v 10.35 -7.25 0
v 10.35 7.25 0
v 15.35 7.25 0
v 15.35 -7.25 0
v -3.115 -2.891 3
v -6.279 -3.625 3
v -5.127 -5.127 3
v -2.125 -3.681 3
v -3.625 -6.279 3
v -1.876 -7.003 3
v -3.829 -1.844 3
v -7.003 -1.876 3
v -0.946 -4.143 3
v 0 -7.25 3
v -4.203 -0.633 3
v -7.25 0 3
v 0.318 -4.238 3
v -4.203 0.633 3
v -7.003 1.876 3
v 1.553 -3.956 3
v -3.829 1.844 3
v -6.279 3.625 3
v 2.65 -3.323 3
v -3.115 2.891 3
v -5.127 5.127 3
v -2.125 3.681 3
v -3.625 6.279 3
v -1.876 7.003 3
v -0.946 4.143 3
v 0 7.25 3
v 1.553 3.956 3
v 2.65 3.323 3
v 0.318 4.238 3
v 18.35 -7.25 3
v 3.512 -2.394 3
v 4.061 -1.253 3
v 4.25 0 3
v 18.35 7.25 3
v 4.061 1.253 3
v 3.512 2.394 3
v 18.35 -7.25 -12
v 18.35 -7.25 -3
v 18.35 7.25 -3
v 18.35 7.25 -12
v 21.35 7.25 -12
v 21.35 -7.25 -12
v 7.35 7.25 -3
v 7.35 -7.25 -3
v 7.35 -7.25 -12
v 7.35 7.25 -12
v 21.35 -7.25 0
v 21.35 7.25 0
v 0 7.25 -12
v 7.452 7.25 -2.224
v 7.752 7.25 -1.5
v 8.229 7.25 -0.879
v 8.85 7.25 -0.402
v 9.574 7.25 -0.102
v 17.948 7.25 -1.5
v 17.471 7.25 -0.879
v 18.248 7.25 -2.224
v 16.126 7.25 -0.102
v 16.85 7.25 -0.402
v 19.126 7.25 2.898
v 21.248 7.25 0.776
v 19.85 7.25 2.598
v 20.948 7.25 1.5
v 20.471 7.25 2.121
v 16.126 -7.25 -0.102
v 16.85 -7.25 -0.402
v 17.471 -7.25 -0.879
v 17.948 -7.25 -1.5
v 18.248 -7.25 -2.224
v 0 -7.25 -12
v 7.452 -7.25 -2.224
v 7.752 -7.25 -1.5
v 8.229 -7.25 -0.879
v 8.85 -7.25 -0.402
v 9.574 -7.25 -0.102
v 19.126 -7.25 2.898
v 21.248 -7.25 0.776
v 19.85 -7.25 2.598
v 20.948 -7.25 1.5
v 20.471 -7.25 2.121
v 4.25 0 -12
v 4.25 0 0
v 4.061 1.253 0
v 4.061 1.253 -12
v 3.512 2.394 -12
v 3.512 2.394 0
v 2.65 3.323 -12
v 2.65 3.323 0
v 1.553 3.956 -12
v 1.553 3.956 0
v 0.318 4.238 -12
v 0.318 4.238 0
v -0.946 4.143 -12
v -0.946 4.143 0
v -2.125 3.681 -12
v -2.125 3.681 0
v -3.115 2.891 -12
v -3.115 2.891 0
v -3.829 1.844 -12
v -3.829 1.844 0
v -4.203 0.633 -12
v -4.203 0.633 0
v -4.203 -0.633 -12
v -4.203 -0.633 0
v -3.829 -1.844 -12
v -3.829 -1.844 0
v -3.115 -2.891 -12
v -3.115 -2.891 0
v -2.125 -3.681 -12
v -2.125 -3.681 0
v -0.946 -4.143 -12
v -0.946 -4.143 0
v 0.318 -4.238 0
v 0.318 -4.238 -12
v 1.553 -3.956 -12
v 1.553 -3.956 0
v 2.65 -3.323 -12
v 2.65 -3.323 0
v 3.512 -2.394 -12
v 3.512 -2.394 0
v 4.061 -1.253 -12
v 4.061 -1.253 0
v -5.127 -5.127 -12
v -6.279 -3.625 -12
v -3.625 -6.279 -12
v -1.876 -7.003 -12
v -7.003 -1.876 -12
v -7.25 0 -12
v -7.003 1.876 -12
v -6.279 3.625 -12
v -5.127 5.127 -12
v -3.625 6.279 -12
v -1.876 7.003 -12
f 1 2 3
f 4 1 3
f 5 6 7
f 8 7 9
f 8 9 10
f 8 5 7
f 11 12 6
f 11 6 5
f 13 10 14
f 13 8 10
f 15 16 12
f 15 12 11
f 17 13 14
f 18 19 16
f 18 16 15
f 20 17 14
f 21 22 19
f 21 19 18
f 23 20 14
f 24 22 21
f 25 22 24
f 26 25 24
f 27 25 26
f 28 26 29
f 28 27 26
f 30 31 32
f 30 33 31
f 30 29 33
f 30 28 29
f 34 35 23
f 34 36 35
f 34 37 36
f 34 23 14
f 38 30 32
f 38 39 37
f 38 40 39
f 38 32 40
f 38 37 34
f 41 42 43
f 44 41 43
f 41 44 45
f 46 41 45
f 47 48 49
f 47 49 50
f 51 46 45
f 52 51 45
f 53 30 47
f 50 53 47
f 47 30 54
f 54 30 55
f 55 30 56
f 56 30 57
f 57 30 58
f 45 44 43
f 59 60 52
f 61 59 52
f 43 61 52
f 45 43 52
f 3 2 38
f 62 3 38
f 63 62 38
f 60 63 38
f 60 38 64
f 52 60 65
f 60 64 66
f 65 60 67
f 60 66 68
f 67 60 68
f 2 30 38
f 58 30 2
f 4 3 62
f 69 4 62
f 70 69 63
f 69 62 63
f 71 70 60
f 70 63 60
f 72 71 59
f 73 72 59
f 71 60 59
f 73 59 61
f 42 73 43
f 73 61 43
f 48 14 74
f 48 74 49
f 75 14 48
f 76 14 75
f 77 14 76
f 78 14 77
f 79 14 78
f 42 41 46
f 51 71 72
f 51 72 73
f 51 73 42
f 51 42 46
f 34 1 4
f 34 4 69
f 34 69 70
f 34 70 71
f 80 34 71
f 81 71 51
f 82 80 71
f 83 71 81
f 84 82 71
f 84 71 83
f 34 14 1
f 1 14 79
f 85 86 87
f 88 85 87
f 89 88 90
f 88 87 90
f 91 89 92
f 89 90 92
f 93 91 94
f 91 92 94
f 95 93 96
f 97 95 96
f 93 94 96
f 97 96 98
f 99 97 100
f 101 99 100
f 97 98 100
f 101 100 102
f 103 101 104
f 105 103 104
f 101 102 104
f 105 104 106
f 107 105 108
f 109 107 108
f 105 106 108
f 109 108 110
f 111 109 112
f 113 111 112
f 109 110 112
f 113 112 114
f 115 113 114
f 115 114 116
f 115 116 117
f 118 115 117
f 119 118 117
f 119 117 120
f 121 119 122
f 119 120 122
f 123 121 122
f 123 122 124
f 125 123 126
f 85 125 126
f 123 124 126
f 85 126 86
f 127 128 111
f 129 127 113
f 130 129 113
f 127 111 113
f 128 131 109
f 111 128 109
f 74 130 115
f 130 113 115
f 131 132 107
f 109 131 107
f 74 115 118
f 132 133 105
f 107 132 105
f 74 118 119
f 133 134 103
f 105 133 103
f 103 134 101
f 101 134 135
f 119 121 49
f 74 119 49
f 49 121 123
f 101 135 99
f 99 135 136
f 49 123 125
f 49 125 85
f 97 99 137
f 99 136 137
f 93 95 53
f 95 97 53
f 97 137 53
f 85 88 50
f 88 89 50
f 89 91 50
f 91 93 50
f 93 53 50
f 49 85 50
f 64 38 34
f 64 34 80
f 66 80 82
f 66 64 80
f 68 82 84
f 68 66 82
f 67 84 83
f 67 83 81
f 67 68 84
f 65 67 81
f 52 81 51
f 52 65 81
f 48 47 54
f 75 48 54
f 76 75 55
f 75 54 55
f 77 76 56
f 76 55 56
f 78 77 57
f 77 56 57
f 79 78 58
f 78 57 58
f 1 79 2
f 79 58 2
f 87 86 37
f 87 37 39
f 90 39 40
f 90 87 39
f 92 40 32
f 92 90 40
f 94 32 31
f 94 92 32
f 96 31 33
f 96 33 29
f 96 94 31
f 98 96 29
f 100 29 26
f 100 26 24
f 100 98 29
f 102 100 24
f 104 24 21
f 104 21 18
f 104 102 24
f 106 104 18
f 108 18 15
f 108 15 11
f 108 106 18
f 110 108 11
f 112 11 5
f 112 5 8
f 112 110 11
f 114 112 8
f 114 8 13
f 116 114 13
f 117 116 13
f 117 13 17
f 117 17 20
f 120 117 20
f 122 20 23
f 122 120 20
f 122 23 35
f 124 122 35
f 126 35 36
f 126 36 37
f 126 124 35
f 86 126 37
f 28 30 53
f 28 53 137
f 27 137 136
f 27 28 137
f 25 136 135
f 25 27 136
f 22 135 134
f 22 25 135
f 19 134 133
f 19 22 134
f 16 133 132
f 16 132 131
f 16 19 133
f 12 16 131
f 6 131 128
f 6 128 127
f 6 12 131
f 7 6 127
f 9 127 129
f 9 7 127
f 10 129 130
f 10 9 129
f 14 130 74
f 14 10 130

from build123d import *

# Parameters (mm, degrees)
F0_R        = 4.25
F0_W        = 11
F0_H        = 14.5
F0_W_2      = 3
F1_DEPTH    = 3
F2_DEPTH    = 12
F3_T1_DEPTH = 14.5
F3_T3_DEPTH = 29.5
F5_R        = 4.25
F6_DEPTH    = 22
F7_DEPTH    = 3
F8_T1_DEPTH = 28


# Not quite as in the source:
# - a fillet or chamfer that OpenCascade refuses, or shapes differently, is made with other operations: its cross-section is extruded or revolved along the edge and cut away or added


with BuildPart() as f1:
    # F0 (on Top) → F1 (new body)
    with BuildSketch(Plane.XY):
        with BuildLine():
            ThreePointArc((0, -7.25), (5.1265241636, -5.1265241636), (7.25, 0))
            ThreePointArc((7.25, 0), (5.1265241636, 5.1265241636), (0, 7.25))
            ThreePointArc((0, 7.25), (-7.25, 0), (0, -7.25))
        make_face()
        Circle(F0_R, mode=Mode.SUBTRACT)
        with BuildLine():
            Line((7.25, -7.25), (7.25, 0))
            ThreePointArc((7.25, 0), (5.1265241636, -5.1265241636), (0, -7.25))
            Line((0, -7.25), (7.25, -7.25))
        make_face()
        with BuildLine():
            ThreePointArc((0, 7.25), (5.1265241636, 5.1265241636), (7.25, 0))
            Line((7.25, 0), (7.25, 7.25))
            Line((7.25, 7.25), (0, 7.25))
        make_face()
        Polygon((7.25, 7.25), (7.25, 0), (7.25, -7.25), (7.35, -7.25), (7.35, 7.25), align=None)
        with Locations((12.85, 0)):
            Rectangle(F0_W, F0_H)
        with Locations((19.85, 0)):
            Rectangle(F0_W_2, F0_H)
    extrude(amount=F1_DEPTH)

    # F0 (on Top) → F2 (join)
    with BuildSketch(Plane.XY):
        with BuildLine():
            ThreePointArc((0, -7.25), (5.1265241636, -5.1265241636), (7.25, 0))
            ThreePointArc((7.25, 0), (5.1265241636, 5.1265241636), (0, 7.25))
            ThreePointArc((0, 7.25), (-7.25, 0), (0, -7.25))
        make_face()
        Circle(F0_R, mode=Mode.SUBTRACT)
        with BuildLine():
            ThreePointArc((0, 7.25), (5.1265241636, 5.1265241636), (7.25, 0))
            Line((7.25, 0), (7.25, 7.25))
            Line((7.25, 7.25), (0, 7.25))
        make_face()
        Polygon((7.25, 7.25), (7.25, 0), (7.25, -7.25), (7.35, -7.25), (7.35, 7.25), align=None)
        with Locations((19.85, 0)):
            Rectangle(F0_W_2, F0_H)
        with BuildLine():
            Line((7.25, -7.25), (7.25, 0))
            ThreePointArc((7.25, 0), (5.1265241636, -5.1265241636), (0, -7.25))
            Line((0, -7.25), (7.25, -7.25))
        make_face()
    extrude(amount=-F2_DEPTH)

    # F3: fillet of radius 3 on 3 edges, made by hand

    # F3_s2 → F3_t1 (join)
    with BuildSketch(Plane.XZ.offset(-7.25)):
        with BuildLine():
            ThreePointArc((7.35, -3), (8.2286796564, -0.8786796564), (10.35, 0))
            Line((10.35, 0), (7.35, 0))
            Line((7.35, 0), (7.35, -3))
        make_face()
        with BuildLine():
            ThreePointArc((15.35, 0), (17.4713203436, -0.8786796564), (18.35, -3))
            Line((18.35, -3), (18.35, 0))
            Line((18.35, 0), (15.35, 0))
        make_face()
    extrude(amount=F3_T1_DEPTH)

    # F3_s4 → F3_t3 (cut)
    with BuildSketch(Plane.XZ.offset(-14.75)):
        with BuildLine():
            ThreePointArc((18.35, 3), (20.4713203436, 2.1213203436), (21.35, 0))
            Line((21.35, 0), (21.35, 3))
            Line((21.35, 3), (18.35, 3))
        make_face()
    extrude(amount=F3_T3_DEPTH, mode=Mode.SUBTRACT)


with BuildPart() as f6:
    # F5 (on offset) → F6 (new body)
    with BuildSketch(Plane(origin=(0, 0, -37), x_dir=(1, 0, 0), z_dir=(0, 0, -1))):
        with BuildLine():
            Line((7.35, 7.25), (0, 7.25))
            ThreePointArc((0, 7.25), (-7.25, 0), (0, -7.25))
            Line((0, -7.25), (7.35, -7.25))
            Line((7.35, -7.25), (7.35, 7.25))
        make_face()
        Circle(F5_R, mode=Mode.SUBTRACT)
    extrude(amount=-F6_DEPTH)

    # F5 (on offset) → F7 (join)
    with BuildSketch(Plane(origin=(0, 0, -37), x_dir=(1, 0, 0), z_dir=(0, 0, -1))):
        with BuildLine():
            Line((7.35, 7.25), (0, 7.25))
            ThreePointArc((0, 7.25), (-7.25, 0), (0, -7.25))
            Line((0, -7.25), (7.35, -7.25))
            Line((7.35, -7.25), (7.35, 7.25))
        make_face()
        Circle(F5_R, mode=Mode.SUBTRACT)
        with BuildLine():
            ThreePointArc((0, -7.25), (-7.25, 0), (0, 7.25))
            Line((0, 7.25), (-37.25, 7.25))
            Line((-37.25, 7.25), (-37.25, 4))
            Line((-37.25, 4), (-22.25, 4))
            ThreePointArc((-22.25, 4), (-18.25, 0), (-22.25, -4))
            Line((-22.25, -4), (-37.25, -4))
            Line((-37.25, -4), (-37.25, -7.25))
            Line((-37.25, -7.25), (0, -7.25))
        make_face()
    extrude(amount=F7_DEPTH)

    # F8: fillet of radius 5 on 2 edges, made by hand

    # F8_s2 → F8_t1 (cut)
    with BuildSketch(Plane.XY.offset(-52.5)):
        with BuildLine():
            ThreePointArc((-32.25, -7.25), (-35.7855339059, -5.7855339059), (-37.25, -2.25))
            Line((-37.25, -2.25), (-37.25, -7.25))
            Line((-37.25, -7.25), (-32.25, -7.25))
        make_face()
        with BuildLine():
            ThreePointArc((-32.25, 7.25), (-35.7855339059, 5.7855339059), (-37.25, 2.25))
            Line((-37.25, 2.25), (-37.25, 7.25))
            Line((-37.25, 7.25), (-32.25, 7.25))
        make_face()
    extrude(amount=F8_T1_DEPTH, mode=Mode.SUBTRACT)


solid = f1.part
